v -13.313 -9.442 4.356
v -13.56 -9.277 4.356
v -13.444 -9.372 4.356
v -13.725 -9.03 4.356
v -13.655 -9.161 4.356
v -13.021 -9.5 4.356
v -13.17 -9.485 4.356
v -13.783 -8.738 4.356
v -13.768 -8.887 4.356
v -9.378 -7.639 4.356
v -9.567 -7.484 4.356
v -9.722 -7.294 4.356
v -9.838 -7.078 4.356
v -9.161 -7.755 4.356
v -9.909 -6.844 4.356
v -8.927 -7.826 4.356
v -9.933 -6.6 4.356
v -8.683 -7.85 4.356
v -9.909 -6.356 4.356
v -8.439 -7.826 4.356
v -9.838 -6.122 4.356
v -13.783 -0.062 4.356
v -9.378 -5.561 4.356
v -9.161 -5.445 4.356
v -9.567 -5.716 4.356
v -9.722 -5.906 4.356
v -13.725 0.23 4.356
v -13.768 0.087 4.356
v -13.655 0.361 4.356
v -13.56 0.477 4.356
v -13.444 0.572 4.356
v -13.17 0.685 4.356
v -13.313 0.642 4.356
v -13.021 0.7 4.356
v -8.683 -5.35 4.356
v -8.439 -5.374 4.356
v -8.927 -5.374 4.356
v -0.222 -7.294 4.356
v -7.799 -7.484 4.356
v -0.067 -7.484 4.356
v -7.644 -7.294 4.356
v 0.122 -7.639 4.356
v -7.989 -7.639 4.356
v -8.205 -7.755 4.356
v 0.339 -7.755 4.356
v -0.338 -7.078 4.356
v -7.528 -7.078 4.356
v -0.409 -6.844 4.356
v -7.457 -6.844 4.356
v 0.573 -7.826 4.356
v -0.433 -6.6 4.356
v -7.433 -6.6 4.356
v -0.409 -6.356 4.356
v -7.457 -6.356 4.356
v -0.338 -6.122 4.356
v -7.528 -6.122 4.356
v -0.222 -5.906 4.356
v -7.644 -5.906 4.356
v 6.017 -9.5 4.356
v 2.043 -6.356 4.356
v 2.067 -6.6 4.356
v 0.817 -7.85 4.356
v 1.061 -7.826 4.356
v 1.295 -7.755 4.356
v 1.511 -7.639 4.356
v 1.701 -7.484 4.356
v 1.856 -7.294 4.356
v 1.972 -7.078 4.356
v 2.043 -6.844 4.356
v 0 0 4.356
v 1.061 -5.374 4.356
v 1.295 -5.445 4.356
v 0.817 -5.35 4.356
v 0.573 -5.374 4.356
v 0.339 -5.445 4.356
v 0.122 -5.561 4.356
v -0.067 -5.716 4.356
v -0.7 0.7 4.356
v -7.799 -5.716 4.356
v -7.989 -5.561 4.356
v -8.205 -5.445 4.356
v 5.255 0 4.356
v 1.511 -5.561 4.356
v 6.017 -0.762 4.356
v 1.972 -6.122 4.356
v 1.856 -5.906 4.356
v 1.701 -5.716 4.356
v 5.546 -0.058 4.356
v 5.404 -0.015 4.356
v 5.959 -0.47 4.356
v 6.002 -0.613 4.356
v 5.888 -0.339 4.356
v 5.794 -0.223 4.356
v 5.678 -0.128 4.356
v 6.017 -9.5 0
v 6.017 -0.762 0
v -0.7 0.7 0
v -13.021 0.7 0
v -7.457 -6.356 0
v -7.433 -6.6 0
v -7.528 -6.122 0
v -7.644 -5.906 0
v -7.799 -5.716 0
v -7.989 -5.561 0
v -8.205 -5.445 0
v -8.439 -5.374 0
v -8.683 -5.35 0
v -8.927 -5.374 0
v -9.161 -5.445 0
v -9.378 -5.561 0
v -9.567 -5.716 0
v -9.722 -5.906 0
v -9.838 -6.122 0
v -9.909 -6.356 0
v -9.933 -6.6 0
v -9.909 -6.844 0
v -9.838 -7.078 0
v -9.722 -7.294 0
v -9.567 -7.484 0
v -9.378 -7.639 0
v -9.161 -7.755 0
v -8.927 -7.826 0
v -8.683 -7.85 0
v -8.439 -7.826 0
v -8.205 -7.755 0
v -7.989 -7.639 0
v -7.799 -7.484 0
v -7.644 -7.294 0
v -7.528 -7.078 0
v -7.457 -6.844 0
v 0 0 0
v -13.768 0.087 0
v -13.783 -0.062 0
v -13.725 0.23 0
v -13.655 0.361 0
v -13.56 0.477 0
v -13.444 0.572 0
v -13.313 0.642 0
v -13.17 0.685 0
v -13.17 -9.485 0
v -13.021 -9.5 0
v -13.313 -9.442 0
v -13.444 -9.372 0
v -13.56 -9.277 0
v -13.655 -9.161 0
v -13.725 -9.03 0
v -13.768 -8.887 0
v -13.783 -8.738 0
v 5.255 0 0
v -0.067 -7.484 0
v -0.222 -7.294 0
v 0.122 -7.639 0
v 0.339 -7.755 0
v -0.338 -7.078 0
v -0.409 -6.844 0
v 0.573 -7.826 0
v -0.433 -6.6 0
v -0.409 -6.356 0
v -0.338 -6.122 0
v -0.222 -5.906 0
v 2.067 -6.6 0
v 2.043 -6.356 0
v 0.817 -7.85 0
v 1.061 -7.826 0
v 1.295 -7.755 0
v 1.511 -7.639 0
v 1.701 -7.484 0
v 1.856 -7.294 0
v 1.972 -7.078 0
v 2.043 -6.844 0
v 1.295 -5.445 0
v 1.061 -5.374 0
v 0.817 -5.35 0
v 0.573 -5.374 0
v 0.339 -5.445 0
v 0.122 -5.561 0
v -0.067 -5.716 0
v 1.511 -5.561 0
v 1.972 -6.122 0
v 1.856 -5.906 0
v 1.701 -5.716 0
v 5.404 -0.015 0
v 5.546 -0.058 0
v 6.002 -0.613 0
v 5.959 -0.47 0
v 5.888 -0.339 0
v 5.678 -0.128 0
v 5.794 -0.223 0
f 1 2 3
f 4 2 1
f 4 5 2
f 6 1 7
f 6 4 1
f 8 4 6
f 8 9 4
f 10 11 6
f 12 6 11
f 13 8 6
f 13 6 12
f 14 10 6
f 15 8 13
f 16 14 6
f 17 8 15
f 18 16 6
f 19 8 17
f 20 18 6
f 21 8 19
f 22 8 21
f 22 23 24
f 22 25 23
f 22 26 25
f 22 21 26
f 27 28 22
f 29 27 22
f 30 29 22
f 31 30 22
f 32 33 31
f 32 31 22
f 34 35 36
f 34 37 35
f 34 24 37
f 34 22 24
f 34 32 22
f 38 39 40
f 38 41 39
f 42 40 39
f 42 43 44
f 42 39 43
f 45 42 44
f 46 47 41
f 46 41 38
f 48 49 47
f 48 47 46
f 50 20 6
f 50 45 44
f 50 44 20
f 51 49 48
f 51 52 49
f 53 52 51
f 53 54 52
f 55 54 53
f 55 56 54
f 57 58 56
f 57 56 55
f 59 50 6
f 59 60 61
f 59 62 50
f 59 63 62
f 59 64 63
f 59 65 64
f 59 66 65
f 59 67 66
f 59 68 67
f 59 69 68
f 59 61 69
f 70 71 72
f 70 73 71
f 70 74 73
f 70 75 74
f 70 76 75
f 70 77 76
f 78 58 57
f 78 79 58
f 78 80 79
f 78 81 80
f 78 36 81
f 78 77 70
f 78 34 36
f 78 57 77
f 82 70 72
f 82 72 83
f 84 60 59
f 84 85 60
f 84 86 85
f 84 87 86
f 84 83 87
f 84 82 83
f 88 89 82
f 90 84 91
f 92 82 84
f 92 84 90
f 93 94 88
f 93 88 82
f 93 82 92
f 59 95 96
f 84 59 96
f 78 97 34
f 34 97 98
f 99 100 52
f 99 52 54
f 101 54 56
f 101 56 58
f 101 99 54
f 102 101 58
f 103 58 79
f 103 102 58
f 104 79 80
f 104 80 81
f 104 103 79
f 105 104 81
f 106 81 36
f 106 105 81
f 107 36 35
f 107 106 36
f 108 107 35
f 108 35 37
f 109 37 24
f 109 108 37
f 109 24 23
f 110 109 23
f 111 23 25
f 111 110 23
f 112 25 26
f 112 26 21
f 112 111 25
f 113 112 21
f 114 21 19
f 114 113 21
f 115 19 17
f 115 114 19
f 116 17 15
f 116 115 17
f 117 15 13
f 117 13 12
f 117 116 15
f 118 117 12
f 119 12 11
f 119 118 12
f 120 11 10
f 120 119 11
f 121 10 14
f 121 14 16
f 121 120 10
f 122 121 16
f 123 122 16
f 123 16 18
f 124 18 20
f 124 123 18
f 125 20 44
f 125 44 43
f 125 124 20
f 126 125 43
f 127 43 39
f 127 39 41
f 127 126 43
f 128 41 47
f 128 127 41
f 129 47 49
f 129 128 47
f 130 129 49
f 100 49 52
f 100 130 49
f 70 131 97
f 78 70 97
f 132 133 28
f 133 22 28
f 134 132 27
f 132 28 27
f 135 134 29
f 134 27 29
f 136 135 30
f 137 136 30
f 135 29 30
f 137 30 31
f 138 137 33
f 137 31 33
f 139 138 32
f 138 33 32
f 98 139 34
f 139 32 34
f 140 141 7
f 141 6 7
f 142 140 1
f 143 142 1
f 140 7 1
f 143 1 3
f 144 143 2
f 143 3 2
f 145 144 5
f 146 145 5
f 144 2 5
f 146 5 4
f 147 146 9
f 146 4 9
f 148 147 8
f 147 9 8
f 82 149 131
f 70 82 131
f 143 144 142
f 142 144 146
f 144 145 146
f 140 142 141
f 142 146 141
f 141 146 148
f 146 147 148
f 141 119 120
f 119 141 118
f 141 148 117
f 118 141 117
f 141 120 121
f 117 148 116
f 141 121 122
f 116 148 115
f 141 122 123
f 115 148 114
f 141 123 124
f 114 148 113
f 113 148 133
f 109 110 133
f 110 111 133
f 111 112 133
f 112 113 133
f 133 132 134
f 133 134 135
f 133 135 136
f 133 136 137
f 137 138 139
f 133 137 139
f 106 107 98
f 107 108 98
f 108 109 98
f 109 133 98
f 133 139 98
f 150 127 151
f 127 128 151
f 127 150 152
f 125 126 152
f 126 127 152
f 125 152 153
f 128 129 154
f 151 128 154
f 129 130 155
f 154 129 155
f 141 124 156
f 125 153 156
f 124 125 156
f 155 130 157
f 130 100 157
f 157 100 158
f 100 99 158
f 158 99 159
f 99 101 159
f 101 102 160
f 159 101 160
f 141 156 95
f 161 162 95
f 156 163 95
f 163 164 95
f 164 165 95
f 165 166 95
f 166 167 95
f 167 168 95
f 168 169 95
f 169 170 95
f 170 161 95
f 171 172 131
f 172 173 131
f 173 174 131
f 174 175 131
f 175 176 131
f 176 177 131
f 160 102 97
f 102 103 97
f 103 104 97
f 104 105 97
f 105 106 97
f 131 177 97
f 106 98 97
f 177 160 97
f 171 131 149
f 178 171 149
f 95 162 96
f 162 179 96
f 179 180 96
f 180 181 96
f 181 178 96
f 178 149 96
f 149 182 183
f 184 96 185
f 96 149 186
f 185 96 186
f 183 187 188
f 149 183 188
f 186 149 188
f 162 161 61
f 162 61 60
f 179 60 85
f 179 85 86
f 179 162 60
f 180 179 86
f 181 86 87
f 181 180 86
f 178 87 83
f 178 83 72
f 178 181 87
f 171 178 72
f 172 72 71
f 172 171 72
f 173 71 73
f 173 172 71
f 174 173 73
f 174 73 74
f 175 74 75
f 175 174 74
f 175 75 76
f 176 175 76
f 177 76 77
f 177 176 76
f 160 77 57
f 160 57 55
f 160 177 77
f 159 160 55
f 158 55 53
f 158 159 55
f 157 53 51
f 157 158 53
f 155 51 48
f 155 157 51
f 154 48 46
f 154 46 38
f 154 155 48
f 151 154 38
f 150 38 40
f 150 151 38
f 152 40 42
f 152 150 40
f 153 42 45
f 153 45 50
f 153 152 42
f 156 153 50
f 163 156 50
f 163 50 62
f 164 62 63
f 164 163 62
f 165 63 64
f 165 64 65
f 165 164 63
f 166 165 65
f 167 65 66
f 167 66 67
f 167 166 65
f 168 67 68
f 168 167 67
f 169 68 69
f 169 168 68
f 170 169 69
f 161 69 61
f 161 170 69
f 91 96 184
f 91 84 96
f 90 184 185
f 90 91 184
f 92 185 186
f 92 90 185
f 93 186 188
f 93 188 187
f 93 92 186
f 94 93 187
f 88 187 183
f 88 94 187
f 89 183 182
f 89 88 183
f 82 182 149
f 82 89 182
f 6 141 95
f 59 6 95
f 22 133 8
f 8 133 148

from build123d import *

# Parameters (mm, degrees)
F0_W     = 0.5
F0_H     = 3.5
F0_R     = 1.25
F1_DEPTH = 4.3564048
F2_R     = 0.762
F3_W     = 19.038
F3_H     = 6.3
F3_H_2   = 3.5
F4_DEPTH = 4.3564048


with BuildPart() as f1:
    # F0 (on Top) → F1 (new body)
    with BuildSketch(Plane.XY):
        with Locations((4.1668843009, -11.25)):
            Rectangle(F0_W, F0_H)
        with Locations((-3.3831156991, -11.25)):
            Rectangle(F0_W, F0_H)
        with Locations((-11.9331156991, -11.25)):
            Rectangle(F0_W, F0_H)
        with BuildLine():
            Line((-10.6081156991, 0.7), (-9.8143656991, 0.7))
            Line((-9.8143656991, 0.7), (-9.8143656991, 1.101979753))
            ThreePointArc((-9.8143656991, 1.101979753), (-9.7252470071, 1.317131308), (-9.5100954521, 1.40625))
            Line((-9.5100954521, 1.40625), (6.0168843009, 1.40625))
            Line((6.0168843009, 1.40625), (6.0168843009, 2.2))
            Line((6.0168843009, 2.2), (6.0168843009, 4.6))
            ThreePointArc((6.0168843009, 4.6), (3.6168843009, 7), (1.2168843009, 4.6))
            Line((1.2168843009, 4.6), (1.2168843009, 2.2))
            Line((1.2168843009, 2.2), (-9.5100954521, 2.2))
            ThreePointArc((-9.5100954521, 2.2), (-10.2865130147, 1.8783973155), (-10.6081156991, 1.101979753))
            Line((-10.6081156991, 1.101979753), (-10.6081156991, 0.7))
        make_face()
        with BuildLine():
            Line((6.0168843009, 0), (0, 0))
            Line((0, 0), (-0.7, 0.7))
            Line((-0.7, 0.7), (-5.9126656991, 0.7))
            ThreePointArc((-5.9126656991, 0.7), (-6.5935156991, 1.38085), (-7.2743656991, 0.7))
            Line((-7.2743656991, 0.7), (-9.8143656991, 0.7))
            Line((-9.8143656991, 0.7), (-10.6081156991, 0.7))
            Line((-10.6081156991, 0.7), (-13.7831156991, 0.7))
            Line((-13.7831156991, 0.7), (-13.7831156991, -9.5))
            Line((-13.7831156991, -9.5), (-12.1831156991, -9.5))
            Line((-12.1831156991, -9.5), (-11.6831156991, -9.5))
            Line((-11.6831156991, -9.5), (-3.6331156991, -9.5))
            Line((-3.6331156991, -9.5), (-3.1331156991, -9.5))
            Line((-3.1331156991, -9.5), (3.9168843009, -9.5))
            Line((3.9168843009, -9.5), (4.4168843009, -9.5))
            Line((4.4168843009, -9.5), (6.0168843009, -9.5))
            Line((6.0168843009, -9.5), (6.0168843009, 0))
        make_face()
        with Locations((-8.6831156991, -6.6)):
            Circle(F0_R, mode=Mode.SUBTRACT)
        with Locations((0.8168843009, -6.6)):
            Circle(F0_R, mode=Mode.SUBTRACT)
    extrude(amount=F1_DEPTH)

    # F2
    f2_edges = [f1.edges().sort_by_distance(p)[0] for p in [
        (6.016884, 0, 2.178202),
        (-13.783116, -9.5, 2.178202),
        (-13.783116, 0.7, 2.178202),
    ]]
    fillet(f2_edges, radius=F2_R)

    # F3 (on face) → F4 (cut, through all)
    with BuildSketch(Plane.XY.offset(4.3564048)):
        with Locations((-3.5021156991, 3.85)):
            Rectangle(F3_W, F3_H)
        with Locations((-3.5021156991, -11.25)):
            Rectangle(F3_W, F3_H_2)
    extrude(amount=-F4_DEPTH, mode=Mode.SUBTRACT)


solid = f1.part
